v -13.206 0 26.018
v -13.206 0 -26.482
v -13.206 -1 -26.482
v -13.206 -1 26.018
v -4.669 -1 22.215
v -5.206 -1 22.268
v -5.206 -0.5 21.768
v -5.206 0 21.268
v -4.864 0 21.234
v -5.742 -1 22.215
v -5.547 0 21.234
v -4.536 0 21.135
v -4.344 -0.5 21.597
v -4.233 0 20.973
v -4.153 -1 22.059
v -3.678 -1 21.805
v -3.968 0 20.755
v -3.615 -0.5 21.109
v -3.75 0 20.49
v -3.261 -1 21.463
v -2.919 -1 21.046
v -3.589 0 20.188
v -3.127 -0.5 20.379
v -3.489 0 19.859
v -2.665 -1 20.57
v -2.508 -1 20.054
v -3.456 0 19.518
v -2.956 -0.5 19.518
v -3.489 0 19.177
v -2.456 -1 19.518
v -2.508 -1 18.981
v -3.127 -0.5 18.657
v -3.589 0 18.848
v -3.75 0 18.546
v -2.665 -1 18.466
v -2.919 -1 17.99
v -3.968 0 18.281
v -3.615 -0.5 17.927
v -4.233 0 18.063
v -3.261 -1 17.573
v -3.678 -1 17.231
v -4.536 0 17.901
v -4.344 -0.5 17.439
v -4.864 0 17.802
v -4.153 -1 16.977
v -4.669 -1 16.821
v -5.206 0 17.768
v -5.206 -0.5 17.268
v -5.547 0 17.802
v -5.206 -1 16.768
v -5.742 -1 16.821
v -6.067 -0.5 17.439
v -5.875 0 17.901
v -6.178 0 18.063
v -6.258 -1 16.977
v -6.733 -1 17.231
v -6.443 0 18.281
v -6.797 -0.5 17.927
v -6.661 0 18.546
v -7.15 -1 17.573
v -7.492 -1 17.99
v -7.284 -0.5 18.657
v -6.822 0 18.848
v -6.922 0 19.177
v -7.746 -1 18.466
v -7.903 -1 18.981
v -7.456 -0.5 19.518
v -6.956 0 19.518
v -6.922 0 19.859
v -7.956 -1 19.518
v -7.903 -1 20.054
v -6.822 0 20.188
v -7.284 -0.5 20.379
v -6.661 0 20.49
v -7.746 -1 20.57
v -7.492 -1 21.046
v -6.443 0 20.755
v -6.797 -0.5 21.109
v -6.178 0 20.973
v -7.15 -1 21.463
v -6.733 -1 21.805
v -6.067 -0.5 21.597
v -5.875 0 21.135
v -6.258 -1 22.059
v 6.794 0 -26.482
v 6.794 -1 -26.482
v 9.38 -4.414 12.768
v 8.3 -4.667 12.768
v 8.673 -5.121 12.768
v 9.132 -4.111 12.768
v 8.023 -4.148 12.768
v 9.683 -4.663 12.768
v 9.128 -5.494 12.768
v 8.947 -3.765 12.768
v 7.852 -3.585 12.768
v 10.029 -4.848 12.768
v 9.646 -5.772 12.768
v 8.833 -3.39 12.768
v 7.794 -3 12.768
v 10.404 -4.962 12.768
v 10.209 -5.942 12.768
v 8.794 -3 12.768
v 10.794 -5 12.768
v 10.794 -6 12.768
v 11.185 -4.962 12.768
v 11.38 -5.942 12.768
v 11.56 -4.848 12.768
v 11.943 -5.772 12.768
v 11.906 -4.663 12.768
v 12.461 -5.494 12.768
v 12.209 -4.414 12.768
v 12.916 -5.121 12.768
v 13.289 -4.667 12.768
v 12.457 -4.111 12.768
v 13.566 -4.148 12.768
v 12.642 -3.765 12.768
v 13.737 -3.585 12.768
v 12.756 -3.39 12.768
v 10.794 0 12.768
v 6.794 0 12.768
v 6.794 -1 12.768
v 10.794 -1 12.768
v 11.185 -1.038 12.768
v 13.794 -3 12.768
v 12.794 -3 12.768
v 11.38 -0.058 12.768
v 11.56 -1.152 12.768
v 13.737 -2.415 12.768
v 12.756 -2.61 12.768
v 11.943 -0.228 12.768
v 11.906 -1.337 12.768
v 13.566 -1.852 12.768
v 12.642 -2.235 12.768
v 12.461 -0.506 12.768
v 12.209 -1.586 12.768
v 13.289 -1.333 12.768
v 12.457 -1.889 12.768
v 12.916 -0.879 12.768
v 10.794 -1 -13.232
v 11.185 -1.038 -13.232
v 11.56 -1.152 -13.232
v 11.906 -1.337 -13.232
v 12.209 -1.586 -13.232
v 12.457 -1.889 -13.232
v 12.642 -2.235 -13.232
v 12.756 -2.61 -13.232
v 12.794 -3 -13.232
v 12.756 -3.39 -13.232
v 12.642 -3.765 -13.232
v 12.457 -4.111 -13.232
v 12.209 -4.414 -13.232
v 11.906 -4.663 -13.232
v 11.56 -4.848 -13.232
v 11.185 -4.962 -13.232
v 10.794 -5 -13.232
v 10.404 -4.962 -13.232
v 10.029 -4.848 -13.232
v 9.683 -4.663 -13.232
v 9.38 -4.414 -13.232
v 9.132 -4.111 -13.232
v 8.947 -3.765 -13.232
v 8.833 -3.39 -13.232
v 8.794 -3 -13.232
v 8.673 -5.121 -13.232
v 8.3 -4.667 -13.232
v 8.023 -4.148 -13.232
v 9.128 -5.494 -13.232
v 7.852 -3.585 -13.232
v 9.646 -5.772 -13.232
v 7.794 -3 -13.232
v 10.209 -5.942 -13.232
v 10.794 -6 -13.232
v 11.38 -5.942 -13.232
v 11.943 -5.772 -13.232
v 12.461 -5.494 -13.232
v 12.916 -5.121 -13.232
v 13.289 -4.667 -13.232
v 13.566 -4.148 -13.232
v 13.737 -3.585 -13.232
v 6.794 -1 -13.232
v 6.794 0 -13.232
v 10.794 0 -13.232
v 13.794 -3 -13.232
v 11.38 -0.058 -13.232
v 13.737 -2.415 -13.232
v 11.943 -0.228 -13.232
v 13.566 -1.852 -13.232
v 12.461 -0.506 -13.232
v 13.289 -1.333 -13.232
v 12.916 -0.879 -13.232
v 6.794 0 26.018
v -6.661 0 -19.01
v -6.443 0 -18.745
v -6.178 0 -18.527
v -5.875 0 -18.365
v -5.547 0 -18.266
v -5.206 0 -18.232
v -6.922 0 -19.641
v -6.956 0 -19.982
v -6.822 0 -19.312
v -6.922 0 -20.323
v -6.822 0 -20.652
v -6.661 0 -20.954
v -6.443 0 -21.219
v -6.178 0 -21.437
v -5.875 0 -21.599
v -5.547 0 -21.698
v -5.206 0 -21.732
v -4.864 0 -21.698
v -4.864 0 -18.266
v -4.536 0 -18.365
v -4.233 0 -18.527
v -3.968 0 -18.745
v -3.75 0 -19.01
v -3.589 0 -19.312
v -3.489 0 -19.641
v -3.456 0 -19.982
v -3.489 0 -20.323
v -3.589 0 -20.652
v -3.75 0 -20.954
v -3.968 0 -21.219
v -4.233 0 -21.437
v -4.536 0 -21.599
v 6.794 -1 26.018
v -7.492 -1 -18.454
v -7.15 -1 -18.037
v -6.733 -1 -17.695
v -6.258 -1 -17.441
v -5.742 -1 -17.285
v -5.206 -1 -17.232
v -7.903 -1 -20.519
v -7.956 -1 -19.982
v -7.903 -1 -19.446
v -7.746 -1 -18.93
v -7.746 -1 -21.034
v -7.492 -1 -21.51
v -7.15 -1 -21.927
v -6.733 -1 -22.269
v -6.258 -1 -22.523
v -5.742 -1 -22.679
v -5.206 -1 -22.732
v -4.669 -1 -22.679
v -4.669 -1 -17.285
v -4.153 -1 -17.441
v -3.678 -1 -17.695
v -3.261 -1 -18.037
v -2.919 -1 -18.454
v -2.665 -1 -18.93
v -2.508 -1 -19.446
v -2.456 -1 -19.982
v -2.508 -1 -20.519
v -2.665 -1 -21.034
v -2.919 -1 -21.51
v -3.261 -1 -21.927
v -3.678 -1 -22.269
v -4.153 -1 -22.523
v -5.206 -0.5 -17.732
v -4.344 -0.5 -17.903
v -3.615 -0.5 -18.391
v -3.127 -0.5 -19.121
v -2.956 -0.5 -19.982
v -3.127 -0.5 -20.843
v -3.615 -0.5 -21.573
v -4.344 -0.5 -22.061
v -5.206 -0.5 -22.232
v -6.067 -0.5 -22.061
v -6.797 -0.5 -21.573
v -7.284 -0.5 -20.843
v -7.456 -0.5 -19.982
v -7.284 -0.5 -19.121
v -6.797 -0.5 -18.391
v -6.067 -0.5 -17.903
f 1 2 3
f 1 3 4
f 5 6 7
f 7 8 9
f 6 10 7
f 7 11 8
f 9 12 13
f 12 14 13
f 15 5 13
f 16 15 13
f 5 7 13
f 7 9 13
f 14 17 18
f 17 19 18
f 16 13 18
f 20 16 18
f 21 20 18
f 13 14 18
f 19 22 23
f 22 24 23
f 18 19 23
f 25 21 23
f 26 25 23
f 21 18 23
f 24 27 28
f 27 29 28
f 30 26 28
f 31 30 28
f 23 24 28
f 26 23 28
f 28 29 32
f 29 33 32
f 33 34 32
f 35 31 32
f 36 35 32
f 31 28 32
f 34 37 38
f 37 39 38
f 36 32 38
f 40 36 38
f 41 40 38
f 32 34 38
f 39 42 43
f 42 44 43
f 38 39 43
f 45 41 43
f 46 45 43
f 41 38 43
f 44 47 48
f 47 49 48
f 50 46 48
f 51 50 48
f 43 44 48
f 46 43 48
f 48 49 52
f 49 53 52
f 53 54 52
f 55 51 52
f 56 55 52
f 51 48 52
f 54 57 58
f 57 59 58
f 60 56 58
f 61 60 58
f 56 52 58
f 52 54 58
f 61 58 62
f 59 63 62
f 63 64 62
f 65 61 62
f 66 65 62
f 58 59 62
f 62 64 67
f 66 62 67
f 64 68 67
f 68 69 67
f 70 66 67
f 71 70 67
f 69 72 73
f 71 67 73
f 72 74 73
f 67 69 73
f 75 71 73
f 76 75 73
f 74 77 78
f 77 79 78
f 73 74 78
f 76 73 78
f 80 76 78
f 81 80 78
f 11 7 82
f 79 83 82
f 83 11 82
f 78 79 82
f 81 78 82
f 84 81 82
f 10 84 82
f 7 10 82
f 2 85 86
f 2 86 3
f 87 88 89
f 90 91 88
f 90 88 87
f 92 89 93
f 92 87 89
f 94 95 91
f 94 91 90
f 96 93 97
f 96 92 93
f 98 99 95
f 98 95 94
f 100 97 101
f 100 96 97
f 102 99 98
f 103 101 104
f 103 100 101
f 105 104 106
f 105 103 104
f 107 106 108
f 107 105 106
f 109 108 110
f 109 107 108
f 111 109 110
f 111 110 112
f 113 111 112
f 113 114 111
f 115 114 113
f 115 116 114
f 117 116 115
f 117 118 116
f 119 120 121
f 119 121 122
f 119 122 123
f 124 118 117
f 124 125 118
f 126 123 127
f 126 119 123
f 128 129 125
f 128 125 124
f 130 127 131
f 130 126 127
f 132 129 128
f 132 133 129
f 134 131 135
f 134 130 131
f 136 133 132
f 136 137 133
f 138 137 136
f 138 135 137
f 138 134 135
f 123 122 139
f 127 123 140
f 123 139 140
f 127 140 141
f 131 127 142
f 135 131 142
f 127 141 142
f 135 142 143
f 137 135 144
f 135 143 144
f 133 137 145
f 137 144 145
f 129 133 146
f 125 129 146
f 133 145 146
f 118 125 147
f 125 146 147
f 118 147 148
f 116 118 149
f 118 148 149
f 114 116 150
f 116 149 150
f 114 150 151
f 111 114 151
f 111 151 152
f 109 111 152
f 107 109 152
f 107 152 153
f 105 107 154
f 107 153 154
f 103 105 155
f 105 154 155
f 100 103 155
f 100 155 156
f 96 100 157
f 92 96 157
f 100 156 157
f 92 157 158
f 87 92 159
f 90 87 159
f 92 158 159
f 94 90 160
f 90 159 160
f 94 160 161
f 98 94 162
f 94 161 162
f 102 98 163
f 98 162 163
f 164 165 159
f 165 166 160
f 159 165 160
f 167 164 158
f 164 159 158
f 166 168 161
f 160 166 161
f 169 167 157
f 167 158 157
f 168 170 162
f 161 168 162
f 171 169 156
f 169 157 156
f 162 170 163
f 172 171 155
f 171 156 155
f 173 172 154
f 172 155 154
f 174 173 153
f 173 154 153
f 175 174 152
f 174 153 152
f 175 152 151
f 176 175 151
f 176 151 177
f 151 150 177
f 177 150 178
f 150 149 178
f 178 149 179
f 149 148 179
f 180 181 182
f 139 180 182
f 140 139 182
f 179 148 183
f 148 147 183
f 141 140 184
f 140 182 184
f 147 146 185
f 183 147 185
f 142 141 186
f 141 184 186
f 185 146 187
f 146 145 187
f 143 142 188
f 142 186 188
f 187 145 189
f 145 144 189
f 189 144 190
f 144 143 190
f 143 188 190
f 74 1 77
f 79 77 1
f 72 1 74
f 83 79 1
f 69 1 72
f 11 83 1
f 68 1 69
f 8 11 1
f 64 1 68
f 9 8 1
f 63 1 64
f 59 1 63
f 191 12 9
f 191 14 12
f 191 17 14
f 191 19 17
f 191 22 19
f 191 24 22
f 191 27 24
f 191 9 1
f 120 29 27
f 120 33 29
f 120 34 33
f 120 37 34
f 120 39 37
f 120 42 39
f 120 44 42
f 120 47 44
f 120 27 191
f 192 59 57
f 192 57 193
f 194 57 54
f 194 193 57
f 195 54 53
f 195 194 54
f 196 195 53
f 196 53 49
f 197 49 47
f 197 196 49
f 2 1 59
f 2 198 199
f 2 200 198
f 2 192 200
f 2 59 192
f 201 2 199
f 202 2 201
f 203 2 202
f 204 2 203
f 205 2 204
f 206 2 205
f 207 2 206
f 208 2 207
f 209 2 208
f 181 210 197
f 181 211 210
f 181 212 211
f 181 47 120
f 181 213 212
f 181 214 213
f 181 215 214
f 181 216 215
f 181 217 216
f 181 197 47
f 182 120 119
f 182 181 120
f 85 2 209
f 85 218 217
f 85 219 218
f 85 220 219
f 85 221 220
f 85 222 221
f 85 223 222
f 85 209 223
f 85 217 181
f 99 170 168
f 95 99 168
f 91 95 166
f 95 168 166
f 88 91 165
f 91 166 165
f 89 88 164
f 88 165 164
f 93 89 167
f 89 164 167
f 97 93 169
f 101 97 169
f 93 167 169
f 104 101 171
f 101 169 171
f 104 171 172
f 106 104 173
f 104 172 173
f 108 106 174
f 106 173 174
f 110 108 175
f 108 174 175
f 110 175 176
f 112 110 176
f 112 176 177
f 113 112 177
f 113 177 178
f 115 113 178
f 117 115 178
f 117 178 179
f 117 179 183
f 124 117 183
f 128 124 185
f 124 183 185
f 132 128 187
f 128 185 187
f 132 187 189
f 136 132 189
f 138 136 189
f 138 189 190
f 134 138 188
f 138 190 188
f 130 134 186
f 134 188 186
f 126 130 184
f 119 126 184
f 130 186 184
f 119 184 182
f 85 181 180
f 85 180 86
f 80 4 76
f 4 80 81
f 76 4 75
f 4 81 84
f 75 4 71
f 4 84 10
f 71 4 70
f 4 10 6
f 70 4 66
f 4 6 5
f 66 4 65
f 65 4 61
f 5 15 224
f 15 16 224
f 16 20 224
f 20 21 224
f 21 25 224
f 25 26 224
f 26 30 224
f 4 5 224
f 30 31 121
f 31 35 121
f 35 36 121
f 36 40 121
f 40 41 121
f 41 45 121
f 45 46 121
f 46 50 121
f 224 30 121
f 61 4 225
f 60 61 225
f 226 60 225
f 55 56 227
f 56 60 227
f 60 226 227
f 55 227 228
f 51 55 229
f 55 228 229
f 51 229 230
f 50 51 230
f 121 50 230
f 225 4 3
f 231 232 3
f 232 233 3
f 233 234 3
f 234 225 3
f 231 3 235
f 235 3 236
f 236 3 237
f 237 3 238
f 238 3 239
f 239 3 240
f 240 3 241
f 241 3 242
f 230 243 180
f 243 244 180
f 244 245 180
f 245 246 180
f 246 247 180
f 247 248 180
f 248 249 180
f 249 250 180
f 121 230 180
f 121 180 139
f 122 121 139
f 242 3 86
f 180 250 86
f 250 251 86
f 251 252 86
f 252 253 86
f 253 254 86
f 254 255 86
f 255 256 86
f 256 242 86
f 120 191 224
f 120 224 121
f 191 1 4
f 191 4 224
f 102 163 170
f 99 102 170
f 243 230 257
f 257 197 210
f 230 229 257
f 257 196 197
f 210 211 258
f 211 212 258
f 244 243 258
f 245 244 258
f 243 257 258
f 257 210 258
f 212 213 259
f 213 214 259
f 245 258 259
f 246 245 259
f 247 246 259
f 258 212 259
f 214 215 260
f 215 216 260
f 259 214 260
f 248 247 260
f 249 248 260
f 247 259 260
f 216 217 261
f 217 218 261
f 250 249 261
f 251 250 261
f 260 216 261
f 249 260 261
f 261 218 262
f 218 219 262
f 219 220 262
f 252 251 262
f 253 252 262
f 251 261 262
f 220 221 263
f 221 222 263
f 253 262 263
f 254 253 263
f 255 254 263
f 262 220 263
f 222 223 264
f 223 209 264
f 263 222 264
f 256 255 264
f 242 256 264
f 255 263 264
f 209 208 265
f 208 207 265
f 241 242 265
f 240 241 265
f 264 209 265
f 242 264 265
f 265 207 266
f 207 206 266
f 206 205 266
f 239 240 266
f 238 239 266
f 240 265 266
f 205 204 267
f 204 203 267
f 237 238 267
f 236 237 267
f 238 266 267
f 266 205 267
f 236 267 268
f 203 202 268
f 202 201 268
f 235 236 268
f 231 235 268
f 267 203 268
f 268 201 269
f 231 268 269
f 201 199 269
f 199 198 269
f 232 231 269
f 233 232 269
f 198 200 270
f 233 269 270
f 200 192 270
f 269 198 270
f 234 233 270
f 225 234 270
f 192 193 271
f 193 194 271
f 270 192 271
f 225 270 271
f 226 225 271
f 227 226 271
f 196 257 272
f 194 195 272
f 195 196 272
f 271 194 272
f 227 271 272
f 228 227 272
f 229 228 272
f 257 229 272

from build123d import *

# Parameters (mm, degrees)
BASE_FLANGE1_DEPTH                                = 1
HEM1_START                                        = -13.232002457
HEM1_DEPTH                                        = 26
CSK_FOR_M2_5_OVAL_HEAD_MACHINE_SCREW1_D           = 3.1
CSK_FOR_M2_5_OVAL_HEAD_MACHINE_SCREW1_DEPTH       = 4
CSK_FOR_M2_5_OVAL_HEAD_MACHINE_SCREW1_CSINK_D     = 5.5
CSK_FOR_M2_5_OVAL_HEAD_MACHINE_SCREW1_CSINK_ANGLE = 90
CSK_FOR_M2_5_OVAL_HEAD_MACHINE_SCREW1_TIP         = 0.931333959


# Read off the part's stored shape, not the designer's step: Hem1
# Sheet-metal steps are written as plain solids
with BuildPart() as part:
    # Sketch1 → Base-Flange1 (new body)
    with BuildSketch(Plane(origin=(0, 0, 0), x_dir=(1, 0, 0), z_dir=(0, 1, 0))):
        Polygon((6.794487322, 26.482002457), (-13.205512678, 26.482002457), (-13.205512678, -26.017997543), (6.794487322, -26.017997543), (6.794487322, -12.767997543), (10.794487322, -12.767997543), (10.794487322, 13.232002457), (6.794487322, 13.232002457), align=None)
    extrude(amount=-BASE_FLANGE1_DEPTH)

    # Hem1 outline → Hem1 (add)
    with BuildSketch(Plane.XY.offset(HEM1_START)):
        with BuildLine():
            Line((8.794487322, -3), (7.794487322, -3))
            ThreePointArc((7.794487322, -3), (12.915807666, -5.121320344), (10.794487322, 0))
            Line((10.794487322, 0), (10.794487322, -1))
            ThreePointArc((10.794487322, -1), (12.208700884, -4.414213562), (8.794487322, -3))
        make_face()
    extrude(amount=HEM1_DEPTH)

    # CSK for M2.5 Oval Head Machine Screw1
    with Locations(Plane(origin=(-5.205512678, -1, -19.982002457), x_dir=(0, 0, -1), z_dir=(0, -1, 0))):
        with Locations((0, 0), (-39.5, 0)):
            CounterSinkHole(CSK_FOR_M2_5_OVAL_HEAD_MACHINE_SCREW1_D / 2, CSK_FOR_M2_5_OVAL_HEAD_MACHINE_SCREW1_CSINK_D / 2, depth=CSK_FOR_M2_5_OVAL_HEAD_MACHINE_SCREW1_DEPTH, counter_sink_angle=CSK_FOR_M2_5_OVAL_HEAD_MACHINE_SCREW1_CSINK_ANGLE)
            with Locations((0, 0, -(CSK_FOR_M2_5_OVAL_HEAD_MACHINE_SCREW1_DEPTH + CSK_FOR_M2_5_OVAL_HEAD_MACHINE_SCREW1_TIP / 2))):  # 118° drill point
                Cone(0, CSK_FOR_M2_5_OVAL_HEAD_MACHINE_SCREW1_D / 2, CSK_FOR_M2_5_OVAL_HEAD_MACHINE_SCREW1_TIP, mode=Mode.SUBTRACT)


solid = part.part
